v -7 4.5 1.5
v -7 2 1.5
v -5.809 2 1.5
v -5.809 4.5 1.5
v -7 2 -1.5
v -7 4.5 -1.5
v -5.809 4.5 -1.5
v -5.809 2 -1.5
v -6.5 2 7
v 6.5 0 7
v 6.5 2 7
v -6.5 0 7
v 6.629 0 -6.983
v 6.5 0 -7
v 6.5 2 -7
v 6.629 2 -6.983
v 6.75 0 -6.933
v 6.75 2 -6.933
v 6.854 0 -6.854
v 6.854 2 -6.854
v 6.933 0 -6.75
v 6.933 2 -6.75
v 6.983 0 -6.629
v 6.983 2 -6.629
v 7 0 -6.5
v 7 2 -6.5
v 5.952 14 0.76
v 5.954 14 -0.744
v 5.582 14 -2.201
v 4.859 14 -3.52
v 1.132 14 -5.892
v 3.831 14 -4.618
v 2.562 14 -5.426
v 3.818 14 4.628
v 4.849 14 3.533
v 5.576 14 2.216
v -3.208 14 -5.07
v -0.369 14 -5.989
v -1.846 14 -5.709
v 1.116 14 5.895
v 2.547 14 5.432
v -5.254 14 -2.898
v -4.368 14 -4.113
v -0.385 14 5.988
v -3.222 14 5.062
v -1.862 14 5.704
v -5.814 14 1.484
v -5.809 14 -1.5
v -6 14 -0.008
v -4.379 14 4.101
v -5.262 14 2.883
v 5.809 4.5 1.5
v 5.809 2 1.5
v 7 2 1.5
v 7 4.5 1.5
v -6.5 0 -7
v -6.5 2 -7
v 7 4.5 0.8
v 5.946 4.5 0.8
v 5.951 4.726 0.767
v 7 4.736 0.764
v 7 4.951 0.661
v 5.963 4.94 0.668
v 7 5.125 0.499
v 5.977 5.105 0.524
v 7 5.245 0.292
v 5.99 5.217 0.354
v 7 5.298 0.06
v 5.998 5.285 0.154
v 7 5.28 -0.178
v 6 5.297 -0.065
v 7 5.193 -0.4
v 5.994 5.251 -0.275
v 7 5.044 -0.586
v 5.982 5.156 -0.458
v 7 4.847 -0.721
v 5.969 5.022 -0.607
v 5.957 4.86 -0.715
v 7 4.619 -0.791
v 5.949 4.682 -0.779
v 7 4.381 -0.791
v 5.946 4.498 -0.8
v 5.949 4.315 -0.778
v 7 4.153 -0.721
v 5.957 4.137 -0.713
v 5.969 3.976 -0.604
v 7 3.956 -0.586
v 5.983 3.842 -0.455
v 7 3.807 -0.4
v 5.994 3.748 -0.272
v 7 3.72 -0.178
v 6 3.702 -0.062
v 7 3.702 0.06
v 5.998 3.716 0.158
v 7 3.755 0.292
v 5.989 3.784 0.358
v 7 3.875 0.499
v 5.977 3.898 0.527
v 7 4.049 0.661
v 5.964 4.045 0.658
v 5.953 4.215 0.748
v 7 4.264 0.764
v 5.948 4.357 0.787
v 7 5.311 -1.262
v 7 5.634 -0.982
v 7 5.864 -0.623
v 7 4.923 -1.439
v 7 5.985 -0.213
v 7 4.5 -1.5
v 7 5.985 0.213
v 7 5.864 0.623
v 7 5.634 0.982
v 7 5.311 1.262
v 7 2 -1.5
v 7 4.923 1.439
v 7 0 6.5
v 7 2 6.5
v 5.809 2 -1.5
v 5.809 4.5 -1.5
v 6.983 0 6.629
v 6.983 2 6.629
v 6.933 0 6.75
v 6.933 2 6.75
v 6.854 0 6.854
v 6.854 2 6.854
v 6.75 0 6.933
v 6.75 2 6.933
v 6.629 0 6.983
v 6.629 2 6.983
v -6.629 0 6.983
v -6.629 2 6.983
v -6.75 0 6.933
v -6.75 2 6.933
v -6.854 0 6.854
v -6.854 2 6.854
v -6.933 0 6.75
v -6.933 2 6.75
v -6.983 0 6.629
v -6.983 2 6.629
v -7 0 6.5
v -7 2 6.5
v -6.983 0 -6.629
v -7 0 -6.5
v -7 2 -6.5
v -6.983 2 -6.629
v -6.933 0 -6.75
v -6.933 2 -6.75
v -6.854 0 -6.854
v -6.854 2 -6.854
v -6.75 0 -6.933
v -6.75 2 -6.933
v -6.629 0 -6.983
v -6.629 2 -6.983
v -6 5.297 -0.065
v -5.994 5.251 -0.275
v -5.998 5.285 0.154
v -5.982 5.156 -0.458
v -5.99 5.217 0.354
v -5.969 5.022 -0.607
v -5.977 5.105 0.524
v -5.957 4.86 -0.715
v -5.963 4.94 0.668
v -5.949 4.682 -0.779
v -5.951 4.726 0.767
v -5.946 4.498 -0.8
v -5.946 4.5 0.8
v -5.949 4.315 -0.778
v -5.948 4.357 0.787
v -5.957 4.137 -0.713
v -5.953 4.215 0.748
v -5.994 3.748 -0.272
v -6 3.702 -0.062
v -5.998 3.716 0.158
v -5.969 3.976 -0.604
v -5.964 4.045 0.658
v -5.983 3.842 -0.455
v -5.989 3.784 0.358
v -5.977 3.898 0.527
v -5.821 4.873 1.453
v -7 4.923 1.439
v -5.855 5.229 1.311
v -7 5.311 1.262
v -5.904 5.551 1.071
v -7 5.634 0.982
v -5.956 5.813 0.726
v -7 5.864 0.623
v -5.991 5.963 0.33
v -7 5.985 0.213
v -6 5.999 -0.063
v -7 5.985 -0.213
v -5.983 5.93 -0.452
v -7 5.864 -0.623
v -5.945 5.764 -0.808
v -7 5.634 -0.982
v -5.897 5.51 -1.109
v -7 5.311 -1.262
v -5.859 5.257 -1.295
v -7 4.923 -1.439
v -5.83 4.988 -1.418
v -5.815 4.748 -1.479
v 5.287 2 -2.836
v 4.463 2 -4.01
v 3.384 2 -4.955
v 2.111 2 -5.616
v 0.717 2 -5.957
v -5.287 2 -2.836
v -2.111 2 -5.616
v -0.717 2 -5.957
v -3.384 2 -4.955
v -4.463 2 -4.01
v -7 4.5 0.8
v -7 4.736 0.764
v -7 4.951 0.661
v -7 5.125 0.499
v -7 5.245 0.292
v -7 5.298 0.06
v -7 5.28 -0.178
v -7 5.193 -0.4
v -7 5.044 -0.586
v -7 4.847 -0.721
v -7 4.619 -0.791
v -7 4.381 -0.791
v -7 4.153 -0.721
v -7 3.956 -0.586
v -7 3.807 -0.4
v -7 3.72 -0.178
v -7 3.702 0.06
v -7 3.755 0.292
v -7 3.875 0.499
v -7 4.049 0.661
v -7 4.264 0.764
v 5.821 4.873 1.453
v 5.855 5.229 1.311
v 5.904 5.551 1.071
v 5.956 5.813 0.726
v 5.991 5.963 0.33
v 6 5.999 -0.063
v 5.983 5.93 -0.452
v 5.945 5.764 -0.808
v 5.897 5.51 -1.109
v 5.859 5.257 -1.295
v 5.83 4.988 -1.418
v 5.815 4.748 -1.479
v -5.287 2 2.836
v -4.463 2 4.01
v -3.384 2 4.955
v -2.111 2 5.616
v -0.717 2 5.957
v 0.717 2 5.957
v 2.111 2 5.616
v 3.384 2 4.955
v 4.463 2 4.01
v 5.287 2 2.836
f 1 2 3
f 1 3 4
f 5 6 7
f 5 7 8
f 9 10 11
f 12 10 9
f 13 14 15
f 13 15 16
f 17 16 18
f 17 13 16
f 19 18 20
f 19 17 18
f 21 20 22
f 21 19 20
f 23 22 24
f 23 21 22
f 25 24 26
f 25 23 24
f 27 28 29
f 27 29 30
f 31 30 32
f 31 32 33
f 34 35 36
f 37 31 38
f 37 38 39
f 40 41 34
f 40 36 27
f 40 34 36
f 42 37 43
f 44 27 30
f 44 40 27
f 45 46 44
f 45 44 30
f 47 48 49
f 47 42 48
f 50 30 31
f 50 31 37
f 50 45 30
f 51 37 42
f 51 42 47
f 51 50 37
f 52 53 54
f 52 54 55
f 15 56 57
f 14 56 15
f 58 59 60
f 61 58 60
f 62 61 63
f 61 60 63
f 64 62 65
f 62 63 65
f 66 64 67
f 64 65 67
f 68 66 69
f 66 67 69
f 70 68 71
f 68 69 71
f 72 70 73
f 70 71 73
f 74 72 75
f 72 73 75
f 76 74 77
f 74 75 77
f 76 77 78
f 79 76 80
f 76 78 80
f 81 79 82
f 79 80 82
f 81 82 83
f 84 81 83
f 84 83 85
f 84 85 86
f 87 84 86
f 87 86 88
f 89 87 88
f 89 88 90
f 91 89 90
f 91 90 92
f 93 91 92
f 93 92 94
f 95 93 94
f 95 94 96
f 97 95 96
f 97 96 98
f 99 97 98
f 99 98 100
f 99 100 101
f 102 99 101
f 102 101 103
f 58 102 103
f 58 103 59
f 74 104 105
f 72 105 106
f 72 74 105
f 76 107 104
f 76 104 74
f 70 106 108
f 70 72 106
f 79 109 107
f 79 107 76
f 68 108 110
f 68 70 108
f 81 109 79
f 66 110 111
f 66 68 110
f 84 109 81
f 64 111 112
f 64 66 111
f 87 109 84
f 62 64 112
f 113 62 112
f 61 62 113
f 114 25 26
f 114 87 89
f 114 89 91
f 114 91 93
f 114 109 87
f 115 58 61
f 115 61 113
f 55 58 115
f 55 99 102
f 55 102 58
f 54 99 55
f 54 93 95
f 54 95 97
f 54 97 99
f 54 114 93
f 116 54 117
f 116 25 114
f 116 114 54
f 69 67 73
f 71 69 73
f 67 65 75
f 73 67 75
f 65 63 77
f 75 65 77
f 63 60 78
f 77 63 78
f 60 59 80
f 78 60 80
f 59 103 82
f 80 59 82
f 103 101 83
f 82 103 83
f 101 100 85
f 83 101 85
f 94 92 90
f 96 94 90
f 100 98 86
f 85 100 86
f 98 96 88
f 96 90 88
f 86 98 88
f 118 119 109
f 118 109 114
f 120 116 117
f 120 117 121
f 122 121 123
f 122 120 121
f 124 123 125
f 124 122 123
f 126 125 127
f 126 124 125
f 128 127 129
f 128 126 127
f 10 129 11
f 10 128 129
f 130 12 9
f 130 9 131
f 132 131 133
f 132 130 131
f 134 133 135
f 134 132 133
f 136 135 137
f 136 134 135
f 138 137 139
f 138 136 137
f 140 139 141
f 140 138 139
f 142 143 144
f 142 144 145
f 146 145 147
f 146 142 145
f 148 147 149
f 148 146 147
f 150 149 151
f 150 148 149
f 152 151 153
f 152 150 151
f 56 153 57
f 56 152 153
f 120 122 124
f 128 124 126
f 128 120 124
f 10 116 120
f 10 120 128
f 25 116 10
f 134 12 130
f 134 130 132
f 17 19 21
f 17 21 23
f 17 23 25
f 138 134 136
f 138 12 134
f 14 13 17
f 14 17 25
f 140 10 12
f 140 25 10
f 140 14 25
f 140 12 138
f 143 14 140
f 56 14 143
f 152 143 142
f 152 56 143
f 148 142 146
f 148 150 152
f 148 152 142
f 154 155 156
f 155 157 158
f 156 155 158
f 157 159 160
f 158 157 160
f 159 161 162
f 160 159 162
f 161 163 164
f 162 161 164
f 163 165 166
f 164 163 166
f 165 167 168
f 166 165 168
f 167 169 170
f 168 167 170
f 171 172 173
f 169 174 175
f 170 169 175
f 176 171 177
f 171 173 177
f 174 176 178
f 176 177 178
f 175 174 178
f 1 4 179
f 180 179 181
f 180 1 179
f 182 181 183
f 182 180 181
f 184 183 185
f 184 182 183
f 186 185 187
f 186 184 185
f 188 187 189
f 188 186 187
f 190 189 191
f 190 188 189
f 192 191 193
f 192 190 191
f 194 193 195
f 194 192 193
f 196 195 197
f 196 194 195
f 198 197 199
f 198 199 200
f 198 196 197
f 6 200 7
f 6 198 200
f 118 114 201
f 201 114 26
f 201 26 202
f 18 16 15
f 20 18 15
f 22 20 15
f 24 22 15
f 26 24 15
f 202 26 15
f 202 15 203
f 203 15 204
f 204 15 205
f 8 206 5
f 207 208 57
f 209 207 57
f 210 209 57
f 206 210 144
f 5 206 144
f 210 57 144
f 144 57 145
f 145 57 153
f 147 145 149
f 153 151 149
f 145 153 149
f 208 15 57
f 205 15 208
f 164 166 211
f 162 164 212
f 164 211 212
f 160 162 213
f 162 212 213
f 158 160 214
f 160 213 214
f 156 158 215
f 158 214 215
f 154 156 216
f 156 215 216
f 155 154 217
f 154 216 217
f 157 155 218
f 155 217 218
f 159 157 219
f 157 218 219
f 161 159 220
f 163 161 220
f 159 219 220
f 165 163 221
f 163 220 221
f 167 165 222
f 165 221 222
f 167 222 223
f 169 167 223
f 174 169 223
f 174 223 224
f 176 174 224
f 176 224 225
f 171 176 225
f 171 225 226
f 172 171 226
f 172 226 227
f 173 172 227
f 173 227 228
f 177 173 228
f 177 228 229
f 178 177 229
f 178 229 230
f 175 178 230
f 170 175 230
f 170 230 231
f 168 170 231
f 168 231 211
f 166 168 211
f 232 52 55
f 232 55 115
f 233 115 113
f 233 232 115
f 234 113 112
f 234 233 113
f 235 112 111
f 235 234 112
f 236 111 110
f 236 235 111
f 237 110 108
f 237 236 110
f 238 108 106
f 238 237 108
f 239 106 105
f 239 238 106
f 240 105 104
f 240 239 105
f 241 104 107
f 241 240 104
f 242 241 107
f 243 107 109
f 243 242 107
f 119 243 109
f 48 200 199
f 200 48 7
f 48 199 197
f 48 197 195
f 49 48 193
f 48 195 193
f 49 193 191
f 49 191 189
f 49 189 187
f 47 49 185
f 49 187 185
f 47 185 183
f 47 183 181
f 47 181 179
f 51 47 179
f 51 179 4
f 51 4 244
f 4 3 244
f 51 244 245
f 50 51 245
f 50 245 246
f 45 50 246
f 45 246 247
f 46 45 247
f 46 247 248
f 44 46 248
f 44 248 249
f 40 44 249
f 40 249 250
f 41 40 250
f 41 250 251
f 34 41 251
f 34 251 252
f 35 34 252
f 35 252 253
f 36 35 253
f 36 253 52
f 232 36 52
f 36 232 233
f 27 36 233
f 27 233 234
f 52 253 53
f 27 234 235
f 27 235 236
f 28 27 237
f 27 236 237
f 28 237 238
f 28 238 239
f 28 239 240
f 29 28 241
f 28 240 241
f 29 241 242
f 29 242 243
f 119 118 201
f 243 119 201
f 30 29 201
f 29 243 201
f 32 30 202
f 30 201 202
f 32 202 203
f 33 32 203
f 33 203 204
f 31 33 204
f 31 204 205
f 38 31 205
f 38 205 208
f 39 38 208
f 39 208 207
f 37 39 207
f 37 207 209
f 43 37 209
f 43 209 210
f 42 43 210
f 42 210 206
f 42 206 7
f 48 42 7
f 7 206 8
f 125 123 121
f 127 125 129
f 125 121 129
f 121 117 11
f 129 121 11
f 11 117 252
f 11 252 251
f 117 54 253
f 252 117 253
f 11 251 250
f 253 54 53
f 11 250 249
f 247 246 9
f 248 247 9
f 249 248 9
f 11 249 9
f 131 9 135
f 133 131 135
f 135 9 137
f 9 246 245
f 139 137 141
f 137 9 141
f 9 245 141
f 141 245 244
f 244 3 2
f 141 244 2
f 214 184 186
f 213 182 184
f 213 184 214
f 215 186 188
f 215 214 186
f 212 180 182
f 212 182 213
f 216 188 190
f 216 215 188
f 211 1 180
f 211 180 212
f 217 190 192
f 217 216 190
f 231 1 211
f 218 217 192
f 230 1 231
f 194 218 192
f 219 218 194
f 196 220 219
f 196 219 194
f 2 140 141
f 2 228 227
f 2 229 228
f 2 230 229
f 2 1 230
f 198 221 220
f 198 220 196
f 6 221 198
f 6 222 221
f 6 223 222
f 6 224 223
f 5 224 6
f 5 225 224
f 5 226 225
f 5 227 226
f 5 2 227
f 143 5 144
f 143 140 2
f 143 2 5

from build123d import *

# Parameters (mm, degrees)
BOSS_EXTRUDE1_DEPTH = 2
BOSS_EXTRUDE2_DEPTH = 14
SKETCH3_R           = 0.8
CUT_EXTRUDE1_DEPTH  = 17.763054614
SKETCH4_R           = 6
BOSS_EXTRUDE3_DEPTH = 12


with BuildPart() as part:
    # Sketch1 → Boss-Extrude1 (new body)
    with BuildSketch(Plane(origin=(0, 0, 0), x_dir=(1, 0, 0), z_dir=(0, 1, 0))):
        with BuildLine():
            Line((-6.5, 7), (6.5, 7))
            ThreePointArc((6.5, 7), (6.853553391, 6.853553391), (7, 6.5))
            Line((7, 6.5), (7, -6.5))
            ThreePointArc((7, -6.5), (6.853553391, -6.853553391), (6.5, -7))
            Line((6.5, -7), (-6.5, -7))
            ThreePointArc((-6.5, -7), (-6.853553391, -6.853553391), (-7, -6.5))
            Line((-7, -6.5), (-7, 6.5))
            ThreePointArc((-7, 6.5), (-6.853553391, 6.853553391), (-6.5, 7))
        make_face()
    extrude(amount=BOSS_EXTRUDE1_DEPTH)

    # Sketch2 → Boss-Extrude2 (add, through all)
    with BuildSketch(Plane.ZY.offset(7)):
        with BuildLine():
            Line((-1.5, 4.5), (-1.5, 2))
            Line((-1.5, 2), (1.5, 2))
            Line((1.5, 2), (1.5, 4.5))
            ThreePointArc((1.5, 4.5), (0, 6), (-1.5, 4.5))
        make_face()
    extrude(amount=-BOSS_EXTRUDE2_DEPTH)

    # Sketch3 → Cut-Extrude1 (cut, through all)
    with BuildSketch(Plane.ZY.offset(7)):
        with Locations((0, 4.5)):
            Circle(SKETCH3_R)
    extrude(amount=-CUT_EXTRUDE1_DEPTH, mode=Mode.SUBTRACT)

    # Sketch4 → Boss-Extrude3 (add)
    with BuildSketch(Plane(origin=(0, 2, 0), x_dir=(1, 0, 0), z_dir=(0, 1, 0))):
        with Locations(Location((0, 0, 0), (0, 0, 165.522487814))):
            Circle(SKETCH4_R)
    extrude(amount=BOSS_EXTRUDE3_DEPTH)


solid = part.part
